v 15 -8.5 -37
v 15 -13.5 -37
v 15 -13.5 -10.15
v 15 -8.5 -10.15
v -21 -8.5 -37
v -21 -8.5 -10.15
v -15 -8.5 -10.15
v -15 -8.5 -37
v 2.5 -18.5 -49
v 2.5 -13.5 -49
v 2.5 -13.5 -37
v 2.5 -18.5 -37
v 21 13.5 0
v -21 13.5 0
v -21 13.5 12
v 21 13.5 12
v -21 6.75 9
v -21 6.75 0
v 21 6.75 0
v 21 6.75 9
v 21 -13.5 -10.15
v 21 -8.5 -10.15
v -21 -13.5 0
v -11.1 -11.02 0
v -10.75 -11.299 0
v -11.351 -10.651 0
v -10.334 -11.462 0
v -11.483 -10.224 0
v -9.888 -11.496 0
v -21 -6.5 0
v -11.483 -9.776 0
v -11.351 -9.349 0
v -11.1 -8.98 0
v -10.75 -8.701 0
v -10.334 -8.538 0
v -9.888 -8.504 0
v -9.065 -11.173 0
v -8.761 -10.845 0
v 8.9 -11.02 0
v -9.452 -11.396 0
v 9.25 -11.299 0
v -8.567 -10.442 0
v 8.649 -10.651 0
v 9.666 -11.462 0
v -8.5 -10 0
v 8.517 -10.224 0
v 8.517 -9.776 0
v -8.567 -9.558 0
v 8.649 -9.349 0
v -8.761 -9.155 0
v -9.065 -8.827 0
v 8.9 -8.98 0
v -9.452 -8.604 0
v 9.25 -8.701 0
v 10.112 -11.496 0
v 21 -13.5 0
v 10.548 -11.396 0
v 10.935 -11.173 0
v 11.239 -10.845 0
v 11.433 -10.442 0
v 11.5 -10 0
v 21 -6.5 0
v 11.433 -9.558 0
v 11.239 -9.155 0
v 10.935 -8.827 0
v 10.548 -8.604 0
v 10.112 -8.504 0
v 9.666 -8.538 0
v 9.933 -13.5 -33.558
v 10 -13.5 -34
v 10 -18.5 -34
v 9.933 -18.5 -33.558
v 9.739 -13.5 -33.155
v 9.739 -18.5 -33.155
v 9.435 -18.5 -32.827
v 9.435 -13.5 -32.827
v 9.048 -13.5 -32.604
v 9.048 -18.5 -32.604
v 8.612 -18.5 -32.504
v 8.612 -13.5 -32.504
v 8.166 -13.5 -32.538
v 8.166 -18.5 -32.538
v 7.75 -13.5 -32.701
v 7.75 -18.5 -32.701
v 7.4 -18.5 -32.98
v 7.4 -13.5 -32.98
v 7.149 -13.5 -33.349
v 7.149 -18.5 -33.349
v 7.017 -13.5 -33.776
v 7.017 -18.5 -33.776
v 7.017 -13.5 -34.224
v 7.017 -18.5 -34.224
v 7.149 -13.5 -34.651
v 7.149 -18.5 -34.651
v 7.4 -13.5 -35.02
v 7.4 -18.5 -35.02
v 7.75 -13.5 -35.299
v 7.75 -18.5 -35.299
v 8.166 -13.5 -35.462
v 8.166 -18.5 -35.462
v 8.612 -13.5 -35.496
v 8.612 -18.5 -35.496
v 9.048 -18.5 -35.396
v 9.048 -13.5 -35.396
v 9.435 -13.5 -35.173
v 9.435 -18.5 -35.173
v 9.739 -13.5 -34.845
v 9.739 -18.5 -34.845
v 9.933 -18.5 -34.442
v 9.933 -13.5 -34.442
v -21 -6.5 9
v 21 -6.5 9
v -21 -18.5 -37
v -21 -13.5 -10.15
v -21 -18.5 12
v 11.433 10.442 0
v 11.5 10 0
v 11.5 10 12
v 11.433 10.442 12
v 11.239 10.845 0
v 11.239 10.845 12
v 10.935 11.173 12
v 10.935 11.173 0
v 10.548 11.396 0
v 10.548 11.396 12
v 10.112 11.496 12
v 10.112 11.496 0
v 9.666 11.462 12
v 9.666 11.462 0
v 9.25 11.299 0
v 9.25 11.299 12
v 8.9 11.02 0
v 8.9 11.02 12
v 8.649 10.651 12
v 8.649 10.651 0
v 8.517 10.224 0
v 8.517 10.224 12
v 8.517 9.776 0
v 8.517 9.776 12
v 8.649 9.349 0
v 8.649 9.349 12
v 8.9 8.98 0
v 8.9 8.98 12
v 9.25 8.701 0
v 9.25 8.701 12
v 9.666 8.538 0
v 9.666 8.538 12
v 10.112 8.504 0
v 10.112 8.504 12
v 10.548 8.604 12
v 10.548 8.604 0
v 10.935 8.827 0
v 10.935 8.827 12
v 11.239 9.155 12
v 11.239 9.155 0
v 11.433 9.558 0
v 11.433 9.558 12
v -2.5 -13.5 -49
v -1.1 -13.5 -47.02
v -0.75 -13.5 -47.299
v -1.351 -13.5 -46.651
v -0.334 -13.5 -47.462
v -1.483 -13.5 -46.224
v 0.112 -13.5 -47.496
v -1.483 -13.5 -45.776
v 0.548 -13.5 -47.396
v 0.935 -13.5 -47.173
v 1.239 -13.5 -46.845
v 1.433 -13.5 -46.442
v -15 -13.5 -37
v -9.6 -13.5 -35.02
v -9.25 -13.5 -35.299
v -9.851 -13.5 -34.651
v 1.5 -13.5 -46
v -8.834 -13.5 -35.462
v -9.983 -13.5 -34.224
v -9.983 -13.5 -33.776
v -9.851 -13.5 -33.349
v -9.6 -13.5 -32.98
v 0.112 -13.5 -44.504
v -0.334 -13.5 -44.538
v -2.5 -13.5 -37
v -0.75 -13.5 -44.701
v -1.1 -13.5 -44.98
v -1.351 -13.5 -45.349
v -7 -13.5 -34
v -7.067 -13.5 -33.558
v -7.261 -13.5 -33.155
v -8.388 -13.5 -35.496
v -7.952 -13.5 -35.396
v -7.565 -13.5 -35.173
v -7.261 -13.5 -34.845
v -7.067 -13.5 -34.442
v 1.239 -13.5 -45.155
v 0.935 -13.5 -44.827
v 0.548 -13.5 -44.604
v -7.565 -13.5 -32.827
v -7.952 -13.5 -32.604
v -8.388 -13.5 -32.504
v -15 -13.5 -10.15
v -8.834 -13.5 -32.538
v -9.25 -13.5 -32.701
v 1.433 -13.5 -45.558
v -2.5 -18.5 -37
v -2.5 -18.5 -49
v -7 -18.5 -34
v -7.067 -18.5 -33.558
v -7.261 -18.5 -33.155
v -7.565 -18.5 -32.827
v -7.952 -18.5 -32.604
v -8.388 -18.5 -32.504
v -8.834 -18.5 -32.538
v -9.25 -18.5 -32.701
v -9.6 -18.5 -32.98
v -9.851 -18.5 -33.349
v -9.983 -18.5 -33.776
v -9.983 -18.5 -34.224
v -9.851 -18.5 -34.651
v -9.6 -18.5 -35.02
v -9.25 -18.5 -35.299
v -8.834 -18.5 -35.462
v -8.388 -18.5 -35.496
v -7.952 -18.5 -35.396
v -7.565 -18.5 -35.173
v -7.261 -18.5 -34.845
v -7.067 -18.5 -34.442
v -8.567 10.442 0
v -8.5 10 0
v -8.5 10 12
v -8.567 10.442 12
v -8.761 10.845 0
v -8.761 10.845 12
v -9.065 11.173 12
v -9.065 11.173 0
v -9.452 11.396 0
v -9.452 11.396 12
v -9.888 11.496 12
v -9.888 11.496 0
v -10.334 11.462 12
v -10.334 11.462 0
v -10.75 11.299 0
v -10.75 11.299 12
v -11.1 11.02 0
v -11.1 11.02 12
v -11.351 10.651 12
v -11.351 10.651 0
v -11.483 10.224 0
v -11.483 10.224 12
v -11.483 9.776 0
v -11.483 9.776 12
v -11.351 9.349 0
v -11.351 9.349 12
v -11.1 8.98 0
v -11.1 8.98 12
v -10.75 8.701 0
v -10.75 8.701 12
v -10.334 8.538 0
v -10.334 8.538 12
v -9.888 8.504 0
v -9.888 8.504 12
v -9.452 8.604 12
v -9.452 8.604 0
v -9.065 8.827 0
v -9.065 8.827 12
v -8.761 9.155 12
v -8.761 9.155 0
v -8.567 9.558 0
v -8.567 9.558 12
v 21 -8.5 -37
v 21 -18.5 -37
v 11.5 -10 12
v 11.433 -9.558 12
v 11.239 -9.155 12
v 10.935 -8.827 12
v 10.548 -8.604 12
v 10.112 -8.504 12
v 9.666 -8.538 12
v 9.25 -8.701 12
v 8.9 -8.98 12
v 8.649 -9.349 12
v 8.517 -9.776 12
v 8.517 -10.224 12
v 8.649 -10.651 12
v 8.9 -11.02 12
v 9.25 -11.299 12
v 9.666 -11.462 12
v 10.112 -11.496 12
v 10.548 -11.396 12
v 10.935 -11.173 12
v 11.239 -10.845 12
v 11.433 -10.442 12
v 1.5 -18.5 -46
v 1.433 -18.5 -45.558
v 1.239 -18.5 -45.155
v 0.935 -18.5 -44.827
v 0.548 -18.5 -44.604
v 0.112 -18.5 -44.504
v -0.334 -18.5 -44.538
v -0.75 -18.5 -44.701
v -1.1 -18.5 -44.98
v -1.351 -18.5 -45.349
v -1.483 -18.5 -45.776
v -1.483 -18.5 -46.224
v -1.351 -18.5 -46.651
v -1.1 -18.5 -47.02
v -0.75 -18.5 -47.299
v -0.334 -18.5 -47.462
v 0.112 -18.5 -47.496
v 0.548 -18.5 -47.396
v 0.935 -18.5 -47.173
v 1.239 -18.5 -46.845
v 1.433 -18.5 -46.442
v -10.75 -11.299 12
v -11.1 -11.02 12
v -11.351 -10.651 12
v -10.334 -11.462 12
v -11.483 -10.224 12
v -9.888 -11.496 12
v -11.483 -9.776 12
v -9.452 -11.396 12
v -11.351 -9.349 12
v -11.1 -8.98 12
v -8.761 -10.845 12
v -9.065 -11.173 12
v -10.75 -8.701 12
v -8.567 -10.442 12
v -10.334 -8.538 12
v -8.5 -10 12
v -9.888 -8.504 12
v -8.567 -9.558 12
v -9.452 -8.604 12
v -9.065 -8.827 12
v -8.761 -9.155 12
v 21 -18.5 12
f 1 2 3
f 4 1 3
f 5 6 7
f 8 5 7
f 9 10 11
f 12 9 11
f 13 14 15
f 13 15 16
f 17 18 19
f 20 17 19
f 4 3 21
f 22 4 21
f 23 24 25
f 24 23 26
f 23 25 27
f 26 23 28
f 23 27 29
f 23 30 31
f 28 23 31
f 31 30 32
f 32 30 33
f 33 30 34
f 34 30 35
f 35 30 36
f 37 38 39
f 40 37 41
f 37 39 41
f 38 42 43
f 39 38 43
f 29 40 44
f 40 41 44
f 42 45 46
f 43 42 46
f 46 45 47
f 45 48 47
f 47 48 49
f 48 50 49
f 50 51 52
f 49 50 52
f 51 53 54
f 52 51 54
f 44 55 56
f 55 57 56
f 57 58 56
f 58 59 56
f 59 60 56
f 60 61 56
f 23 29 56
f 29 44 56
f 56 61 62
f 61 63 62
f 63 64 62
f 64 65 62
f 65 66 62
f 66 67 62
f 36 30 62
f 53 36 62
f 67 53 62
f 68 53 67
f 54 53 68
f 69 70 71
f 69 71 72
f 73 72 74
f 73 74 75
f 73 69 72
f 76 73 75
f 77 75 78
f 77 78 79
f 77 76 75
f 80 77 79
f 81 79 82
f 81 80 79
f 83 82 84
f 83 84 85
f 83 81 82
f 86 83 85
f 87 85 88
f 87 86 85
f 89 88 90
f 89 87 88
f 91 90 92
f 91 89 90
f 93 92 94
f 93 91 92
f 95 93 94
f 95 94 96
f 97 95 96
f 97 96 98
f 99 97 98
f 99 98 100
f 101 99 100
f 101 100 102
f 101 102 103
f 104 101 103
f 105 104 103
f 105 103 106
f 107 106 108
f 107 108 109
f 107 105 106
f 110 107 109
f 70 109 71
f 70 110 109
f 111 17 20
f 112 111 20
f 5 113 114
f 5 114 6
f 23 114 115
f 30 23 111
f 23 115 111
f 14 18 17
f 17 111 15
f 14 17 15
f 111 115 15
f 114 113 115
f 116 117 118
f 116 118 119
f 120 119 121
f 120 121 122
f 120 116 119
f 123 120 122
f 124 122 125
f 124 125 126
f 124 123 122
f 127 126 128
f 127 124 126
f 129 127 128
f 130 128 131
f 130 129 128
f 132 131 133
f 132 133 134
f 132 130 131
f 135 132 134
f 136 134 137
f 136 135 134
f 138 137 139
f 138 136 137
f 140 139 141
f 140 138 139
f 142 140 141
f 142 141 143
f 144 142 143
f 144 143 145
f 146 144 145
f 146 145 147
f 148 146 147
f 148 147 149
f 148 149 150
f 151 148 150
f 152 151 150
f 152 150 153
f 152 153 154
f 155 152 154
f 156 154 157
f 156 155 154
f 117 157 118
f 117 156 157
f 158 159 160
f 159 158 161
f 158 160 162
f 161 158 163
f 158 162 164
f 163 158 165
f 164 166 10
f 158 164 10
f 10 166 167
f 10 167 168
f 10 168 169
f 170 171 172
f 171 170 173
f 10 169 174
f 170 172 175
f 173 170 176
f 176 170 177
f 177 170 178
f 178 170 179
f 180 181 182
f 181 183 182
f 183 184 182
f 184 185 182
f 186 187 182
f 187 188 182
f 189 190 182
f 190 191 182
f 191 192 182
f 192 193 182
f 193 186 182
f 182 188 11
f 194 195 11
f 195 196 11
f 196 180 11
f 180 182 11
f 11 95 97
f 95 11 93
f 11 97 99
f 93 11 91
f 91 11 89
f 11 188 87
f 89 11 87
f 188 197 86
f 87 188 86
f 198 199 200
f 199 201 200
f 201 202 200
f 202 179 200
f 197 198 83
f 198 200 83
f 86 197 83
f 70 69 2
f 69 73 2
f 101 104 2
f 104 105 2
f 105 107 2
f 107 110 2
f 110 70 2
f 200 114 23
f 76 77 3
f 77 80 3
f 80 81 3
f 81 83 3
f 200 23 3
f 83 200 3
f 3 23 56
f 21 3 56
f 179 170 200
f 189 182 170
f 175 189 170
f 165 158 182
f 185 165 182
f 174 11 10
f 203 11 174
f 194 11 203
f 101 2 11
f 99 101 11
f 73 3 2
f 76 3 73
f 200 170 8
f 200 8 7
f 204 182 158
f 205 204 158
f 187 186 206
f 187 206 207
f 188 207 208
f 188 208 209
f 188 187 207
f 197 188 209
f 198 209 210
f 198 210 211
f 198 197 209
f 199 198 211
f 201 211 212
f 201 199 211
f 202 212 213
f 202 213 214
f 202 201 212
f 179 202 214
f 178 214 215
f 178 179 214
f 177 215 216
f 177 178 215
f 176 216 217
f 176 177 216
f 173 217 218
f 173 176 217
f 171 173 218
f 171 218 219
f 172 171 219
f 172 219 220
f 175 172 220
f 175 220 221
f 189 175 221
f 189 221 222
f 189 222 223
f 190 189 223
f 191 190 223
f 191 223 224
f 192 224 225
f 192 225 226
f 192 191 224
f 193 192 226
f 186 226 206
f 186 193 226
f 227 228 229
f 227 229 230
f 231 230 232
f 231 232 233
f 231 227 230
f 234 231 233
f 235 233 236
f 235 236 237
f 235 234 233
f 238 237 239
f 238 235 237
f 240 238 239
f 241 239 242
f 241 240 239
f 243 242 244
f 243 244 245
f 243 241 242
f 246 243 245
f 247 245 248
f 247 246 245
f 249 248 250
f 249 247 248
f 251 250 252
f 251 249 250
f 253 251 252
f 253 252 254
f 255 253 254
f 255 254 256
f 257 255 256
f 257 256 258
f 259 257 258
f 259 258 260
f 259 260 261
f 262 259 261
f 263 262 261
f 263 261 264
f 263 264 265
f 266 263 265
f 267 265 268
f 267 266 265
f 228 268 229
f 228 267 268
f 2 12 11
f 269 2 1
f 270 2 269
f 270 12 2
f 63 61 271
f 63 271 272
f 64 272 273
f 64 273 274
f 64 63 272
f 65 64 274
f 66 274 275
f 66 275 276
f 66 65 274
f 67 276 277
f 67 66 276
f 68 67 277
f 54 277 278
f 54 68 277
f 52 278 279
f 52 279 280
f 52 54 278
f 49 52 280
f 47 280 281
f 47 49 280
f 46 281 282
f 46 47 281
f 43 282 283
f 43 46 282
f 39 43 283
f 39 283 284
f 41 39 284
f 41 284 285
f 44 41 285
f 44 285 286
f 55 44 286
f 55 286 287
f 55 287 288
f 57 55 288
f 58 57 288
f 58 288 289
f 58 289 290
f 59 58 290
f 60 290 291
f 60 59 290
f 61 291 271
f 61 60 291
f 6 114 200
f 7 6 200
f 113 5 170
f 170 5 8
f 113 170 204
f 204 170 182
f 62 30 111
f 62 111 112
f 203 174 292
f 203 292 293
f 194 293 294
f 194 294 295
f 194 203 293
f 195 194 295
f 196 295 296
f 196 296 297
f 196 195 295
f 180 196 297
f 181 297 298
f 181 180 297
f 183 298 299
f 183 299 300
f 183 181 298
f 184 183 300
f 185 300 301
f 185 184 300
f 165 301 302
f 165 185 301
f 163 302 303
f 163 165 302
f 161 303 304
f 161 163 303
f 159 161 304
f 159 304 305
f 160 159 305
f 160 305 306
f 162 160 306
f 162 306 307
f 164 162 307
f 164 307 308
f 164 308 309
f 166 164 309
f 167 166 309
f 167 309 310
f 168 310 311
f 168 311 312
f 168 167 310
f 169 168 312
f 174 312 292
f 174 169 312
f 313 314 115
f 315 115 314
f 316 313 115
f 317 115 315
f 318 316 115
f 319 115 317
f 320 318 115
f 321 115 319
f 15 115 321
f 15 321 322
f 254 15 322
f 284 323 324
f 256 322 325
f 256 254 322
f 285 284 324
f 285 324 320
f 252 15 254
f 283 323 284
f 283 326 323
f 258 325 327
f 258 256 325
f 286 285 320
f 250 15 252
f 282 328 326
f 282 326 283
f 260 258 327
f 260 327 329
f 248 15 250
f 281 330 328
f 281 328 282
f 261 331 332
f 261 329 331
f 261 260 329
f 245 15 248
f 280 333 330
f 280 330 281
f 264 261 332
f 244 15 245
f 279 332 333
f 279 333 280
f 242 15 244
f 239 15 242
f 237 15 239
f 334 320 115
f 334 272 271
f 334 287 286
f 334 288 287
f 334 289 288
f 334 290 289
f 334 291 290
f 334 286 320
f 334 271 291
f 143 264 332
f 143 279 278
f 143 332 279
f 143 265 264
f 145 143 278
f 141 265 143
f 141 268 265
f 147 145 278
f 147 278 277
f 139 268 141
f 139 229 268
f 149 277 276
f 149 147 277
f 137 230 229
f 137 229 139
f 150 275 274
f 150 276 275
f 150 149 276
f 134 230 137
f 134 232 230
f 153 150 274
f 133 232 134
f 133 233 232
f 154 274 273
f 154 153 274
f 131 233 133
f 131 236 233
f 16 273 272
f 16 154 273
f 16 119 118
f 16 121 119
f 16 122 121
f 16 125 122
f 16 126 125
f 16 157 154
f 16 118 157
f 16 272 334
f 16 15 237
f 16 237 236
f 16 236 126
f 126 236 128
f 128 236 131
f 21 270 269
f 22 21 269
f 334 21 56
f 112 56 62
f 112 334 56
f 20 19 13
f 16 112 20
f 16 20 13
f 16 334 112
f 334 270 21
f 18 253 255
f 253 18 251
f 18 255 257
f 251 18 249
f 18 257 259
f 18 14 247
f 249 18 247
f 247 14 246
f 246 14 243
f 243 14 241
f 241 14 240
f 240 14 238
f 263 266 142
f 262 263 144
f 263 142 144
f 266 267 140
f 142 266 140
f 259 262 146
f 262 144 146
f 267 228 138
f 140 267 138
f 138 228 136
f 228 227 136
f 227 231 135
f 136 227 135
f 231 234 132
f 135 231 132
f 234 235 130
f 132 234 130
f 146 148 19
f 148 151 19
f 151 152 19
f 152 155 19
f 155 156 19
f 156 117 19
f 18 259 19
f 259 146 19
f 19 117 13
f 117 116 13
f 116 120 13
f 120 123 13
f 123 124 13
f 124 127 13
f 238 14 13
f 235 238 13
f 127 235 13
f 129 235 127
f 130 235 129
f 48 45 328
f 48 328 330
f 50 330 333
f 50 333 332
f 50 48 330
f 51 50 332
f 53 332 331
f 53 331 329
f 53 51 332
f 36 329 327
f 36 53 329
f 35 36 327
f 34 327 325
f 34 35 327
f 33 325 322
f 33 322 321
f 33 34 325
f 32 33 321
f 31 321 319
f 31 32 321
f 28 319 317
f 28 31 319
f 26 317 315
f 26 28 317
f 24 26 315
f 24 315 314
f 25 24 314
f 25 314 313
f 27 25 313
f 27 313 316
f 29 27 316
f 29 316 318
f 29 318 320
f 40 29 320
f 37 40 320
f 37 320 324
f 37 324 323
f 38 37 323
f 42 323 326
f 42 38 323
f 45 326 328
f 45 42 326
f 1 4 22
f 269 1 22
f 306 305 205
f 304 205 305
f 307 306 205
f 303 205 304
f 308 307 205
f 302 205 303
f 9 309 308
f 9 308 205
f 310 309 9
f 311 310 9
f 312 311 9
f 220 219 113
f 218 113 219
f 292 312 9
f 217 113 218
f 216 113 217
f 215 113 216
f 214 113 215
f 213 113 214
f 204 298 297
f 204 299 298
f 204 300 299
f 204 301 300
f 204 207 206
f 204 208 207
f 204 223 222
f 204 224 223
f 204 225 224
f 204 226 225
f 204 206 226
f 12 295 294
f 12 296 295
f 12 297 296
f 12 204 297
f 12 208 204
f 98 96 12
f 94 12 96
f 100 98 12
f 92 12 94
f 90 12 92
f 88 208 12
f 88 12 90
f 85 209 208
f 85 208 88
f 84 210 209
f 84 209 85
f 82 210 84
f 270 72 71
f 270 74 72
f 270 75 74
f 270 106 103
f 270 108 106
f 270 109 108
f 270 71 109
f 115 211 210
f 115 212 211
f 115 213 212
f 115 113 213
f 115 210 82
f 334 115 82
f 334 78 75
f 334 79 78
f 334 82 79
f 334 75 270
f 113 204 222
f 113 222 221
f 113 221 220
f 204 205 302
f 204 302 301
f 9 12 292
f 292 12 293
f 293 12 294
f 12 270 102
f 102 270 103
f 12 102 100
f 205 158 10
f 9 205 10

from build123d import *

# Parameters (mm, degrees)
SKETCH1_W             = 42
SKETCH1_H             = 7
SKETCH1_R             = 1.5
BOSS_EXTRUDE1_DEPTH   = 12
SKETCH1_H_2           = 6.75
BOSS_EXTRUDE1_2_DEPTH = 12
SKETCH2_R             = 1.5
BOSS_EXTRUDE2_DEPTH   = 5
SKETCH2_3_W           = 6
SKETCH2_3_H           = 26.85
BOSS_EXTRUDE3_DEPTH   = 5
BOSS_EXTRUDE4_START   = 12
SKETCH1_3_W           = 42
SKETCH1_3_H           = 13.25
BOSS_EXTRUDE4_DEPTH   = 3


with BuildPart() as part:
    # Sketch1 → Boss-Extrude1 (new body)
    with BuildSketch(Plane.XY):
        with Locations((0, -10)):
            Rectangle(SKETCH1_W, SKETCH1_H)
        with Locations((-10, -10)):
            Circle(SKETCH1_R, mode=Mode.SUBTRACT)
        with Locations((10, -10)):
            Circle(SKETCH1_R, mode=Mode.SUBTRACT)
    extrude(amount=BOSS_EXTRUDE1_DEPTH)

    # Sketch2 → Boss-Extrude2 (add)
    with BuildSketch(Plane.XZ.offset(13.5)):
        Polygon((21, 12), (-21, 12), (-21, -37), (-2.5, -37), (-2.5, -49), (2.5, -49), (2.5, -37), (21, -37), align=None)
        with Locations((-8.5, -34)):
            Circle(SKETCH2_R, mode=Mode.SUBTRACT)
        with Locations((8.5, -34)):
            Circle(SKETCH2_R, mode=Mode.SUBTRACT)
        with Locations((0, -46)):
            Circle(SKETCH2_R, mode=Mode.SUBTRACT)
    extrude(amount=BOSS_EXTRUDE2_DEPTH)

    # Sketch2<3> → Boss-Extrude3 (add)
    with BuildSketch(Plane.XZ.offset(13.5)):
        with Locations((18, -23.575)):
            Rectangle(SKETCH2_3_W, SKETCH2_3_H)
        with Locations((-18, -23.575)):
            Rectangle(SKETCH2_3_W, SKETCH2_3_H)
    extrude(amount=-BOSS_EXTRUDE3_DEPTH)



with BuildPart() as body_2:
    # Sketch1 → Boss-Extrude1 2 (new body)
    with BuildSketch(Plane.XY):
        with Locations((0, 10.125)):
            Rectangle(SKETCH1_W, SKETCH1_H_2)
        with Locations((10, 10)):
            Circle(SKETCH1_R, mode=Mode.SUBTRACT)
        with Locations((-10, 10)):
            Circle(SKETCH1_R, mode=Mode.SUBTRACT)
    extrude(amount=BOSS_EXTRUDE1_2_DEPTH)


with BuildPart() as part_1:
    add(part.part)

    add(body_2.part)  # Boss-Extrude4 merges body 2
    # Sketch1<3> → Boss-Extrude4 (add)
    with BuildSketch(Plane.XY.offset(BOSS_EXTRUDE4_START)):
        with Locations((0, 0.125)):
            Rectangle(SKETCH1_3_W, SKETCH1_3_H)
    extrude(amount=-BOSS_EXTRUDE4_DEPTH)


solid = part_1.part
